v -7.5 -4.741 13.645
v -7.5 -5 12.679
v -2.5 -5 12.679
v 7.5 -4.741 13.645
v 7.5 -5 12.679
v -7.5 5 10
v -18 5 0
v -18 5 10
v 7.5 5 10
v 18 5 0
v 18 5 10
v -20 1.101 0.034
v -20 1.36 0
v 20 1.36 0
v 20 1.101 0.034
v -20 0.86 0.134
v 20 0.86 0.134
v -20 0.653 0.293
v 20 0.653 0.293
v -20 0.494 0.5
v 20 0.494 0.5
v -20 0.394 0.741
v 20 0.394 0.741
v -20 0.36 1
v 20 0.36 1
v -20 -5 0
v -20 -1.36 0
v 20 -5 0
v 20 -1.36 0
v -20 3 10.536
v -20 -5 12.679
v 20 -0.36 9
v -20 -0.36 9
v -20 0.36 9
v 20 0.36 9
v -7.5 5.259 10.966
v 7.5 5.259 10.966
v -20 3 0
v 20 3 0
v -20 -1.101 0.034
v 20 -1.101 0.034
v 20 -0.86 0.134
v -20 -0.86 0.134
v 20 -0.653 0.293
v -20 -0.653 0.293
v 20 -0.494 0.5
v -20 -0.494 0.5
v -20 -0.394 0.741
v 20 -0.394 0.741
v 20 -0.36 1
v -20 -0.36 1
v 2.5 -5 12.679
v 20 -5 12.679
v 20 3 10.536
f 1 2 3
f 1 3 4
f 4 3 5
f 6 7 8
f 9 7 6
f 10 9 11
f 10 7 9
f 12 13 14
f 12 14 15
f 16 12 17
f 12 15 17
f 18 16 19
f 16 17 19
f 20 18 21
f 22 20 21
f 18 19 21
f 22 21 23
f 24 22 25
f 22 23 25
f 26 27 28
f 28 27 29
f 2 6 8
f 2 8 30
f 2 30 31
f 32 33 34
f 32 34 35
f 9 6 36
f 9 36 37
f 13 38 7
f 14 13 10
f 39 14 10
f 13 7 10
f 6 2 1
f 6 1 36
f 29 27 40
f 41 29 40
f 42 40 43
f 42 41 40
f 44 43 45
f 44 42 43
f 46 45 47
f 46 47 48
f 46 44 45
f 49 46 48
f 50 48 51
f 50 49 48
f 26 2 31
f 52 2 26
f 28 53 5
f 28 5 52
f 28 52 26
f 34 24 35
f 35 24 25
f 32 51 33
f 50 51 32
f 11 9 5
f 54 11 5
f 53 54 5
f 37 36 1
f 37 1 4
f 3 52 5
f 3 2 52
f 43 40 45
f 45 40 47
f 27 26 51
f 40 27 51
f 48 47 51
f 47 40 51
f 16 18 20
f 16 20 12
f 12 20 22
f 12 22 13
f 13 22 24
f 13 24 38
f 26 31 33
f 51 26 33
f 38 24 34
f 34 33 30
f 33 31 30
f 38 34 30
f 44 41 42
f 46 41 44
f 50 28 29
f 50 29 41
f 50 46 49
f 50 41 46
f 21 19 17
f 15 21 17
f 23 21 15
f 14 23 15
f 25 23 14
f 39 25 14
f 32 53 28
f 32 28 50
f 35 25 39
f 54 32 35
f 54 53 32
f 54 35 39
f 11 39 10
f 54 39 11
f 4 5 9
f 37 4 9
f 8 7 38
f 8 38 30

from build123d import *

# Parameters (mm, degrees)
F0_W     = 40
F0_H     = 10
F1_DEPTH = 10
F3_DEPTH = 40
F4_W     = 15
F4_H     = 10.352762
F5_DEPTH = 1
F6_W     = 40
F6_H     = 0.72
F7_DEPTH = 9
F8_R     = 1
F9_SIZE  = 2


with BuildPart() as f1:
    # F0 (on Top) → F1 (new body)
    with BuildSketch(Plane.XY):
        Rectangle(F0_W, F0_H)
    extrude(amount=F1_DEPTH)

    # F2 (on face) → F3 (join, through all)
    with BuildSketch(Plane.YZ.offset(20)):
        Polygon((-5, 10), (5, 10), (-5, 12.679492), align=None)
    extrude(amount=-F3_DEPTH)

    # F4 (on face) → F5 (join)
    with BuildSketch(Plane(origin=(0, 2.834936, 10.580127), x_dir=(1, 0, 0), z_dir=(0, 0.258819, 0.965926))):
        with Locations((0, -2.934942)):
            Rectangle(F4_W, F4_H)
    extrude(amount=F5_DEPTH)

    # F6 (on face) → F7 (cut)
    with BuildSketch(Plane(origin=(0, 0, 0), x_dir=(1, 0, 0), z_dir=(0, 0, -1))):
        Rectangle(F6_W, F6_H)
    extrude(amount=-F7_DEPTH, mode=Mode.SUBTRACT)

    # F8
    f8_edges = [f1.edges().sort_by_distance(p)[0] for p in [
        (0, -0.36, 0),
        (0, 0.36, 0),
    ]]
    fillet(f8_edges, radius=F8_R)

    # F9
    f9_edges = [f1.edges().sort_by_distance(p)[0] for p in [
        (20, 5, 5),
        (-20, 5, 5),
    ]]
    chamfer(f9_edges, length=F9_SIZE)


solid = f1.part
